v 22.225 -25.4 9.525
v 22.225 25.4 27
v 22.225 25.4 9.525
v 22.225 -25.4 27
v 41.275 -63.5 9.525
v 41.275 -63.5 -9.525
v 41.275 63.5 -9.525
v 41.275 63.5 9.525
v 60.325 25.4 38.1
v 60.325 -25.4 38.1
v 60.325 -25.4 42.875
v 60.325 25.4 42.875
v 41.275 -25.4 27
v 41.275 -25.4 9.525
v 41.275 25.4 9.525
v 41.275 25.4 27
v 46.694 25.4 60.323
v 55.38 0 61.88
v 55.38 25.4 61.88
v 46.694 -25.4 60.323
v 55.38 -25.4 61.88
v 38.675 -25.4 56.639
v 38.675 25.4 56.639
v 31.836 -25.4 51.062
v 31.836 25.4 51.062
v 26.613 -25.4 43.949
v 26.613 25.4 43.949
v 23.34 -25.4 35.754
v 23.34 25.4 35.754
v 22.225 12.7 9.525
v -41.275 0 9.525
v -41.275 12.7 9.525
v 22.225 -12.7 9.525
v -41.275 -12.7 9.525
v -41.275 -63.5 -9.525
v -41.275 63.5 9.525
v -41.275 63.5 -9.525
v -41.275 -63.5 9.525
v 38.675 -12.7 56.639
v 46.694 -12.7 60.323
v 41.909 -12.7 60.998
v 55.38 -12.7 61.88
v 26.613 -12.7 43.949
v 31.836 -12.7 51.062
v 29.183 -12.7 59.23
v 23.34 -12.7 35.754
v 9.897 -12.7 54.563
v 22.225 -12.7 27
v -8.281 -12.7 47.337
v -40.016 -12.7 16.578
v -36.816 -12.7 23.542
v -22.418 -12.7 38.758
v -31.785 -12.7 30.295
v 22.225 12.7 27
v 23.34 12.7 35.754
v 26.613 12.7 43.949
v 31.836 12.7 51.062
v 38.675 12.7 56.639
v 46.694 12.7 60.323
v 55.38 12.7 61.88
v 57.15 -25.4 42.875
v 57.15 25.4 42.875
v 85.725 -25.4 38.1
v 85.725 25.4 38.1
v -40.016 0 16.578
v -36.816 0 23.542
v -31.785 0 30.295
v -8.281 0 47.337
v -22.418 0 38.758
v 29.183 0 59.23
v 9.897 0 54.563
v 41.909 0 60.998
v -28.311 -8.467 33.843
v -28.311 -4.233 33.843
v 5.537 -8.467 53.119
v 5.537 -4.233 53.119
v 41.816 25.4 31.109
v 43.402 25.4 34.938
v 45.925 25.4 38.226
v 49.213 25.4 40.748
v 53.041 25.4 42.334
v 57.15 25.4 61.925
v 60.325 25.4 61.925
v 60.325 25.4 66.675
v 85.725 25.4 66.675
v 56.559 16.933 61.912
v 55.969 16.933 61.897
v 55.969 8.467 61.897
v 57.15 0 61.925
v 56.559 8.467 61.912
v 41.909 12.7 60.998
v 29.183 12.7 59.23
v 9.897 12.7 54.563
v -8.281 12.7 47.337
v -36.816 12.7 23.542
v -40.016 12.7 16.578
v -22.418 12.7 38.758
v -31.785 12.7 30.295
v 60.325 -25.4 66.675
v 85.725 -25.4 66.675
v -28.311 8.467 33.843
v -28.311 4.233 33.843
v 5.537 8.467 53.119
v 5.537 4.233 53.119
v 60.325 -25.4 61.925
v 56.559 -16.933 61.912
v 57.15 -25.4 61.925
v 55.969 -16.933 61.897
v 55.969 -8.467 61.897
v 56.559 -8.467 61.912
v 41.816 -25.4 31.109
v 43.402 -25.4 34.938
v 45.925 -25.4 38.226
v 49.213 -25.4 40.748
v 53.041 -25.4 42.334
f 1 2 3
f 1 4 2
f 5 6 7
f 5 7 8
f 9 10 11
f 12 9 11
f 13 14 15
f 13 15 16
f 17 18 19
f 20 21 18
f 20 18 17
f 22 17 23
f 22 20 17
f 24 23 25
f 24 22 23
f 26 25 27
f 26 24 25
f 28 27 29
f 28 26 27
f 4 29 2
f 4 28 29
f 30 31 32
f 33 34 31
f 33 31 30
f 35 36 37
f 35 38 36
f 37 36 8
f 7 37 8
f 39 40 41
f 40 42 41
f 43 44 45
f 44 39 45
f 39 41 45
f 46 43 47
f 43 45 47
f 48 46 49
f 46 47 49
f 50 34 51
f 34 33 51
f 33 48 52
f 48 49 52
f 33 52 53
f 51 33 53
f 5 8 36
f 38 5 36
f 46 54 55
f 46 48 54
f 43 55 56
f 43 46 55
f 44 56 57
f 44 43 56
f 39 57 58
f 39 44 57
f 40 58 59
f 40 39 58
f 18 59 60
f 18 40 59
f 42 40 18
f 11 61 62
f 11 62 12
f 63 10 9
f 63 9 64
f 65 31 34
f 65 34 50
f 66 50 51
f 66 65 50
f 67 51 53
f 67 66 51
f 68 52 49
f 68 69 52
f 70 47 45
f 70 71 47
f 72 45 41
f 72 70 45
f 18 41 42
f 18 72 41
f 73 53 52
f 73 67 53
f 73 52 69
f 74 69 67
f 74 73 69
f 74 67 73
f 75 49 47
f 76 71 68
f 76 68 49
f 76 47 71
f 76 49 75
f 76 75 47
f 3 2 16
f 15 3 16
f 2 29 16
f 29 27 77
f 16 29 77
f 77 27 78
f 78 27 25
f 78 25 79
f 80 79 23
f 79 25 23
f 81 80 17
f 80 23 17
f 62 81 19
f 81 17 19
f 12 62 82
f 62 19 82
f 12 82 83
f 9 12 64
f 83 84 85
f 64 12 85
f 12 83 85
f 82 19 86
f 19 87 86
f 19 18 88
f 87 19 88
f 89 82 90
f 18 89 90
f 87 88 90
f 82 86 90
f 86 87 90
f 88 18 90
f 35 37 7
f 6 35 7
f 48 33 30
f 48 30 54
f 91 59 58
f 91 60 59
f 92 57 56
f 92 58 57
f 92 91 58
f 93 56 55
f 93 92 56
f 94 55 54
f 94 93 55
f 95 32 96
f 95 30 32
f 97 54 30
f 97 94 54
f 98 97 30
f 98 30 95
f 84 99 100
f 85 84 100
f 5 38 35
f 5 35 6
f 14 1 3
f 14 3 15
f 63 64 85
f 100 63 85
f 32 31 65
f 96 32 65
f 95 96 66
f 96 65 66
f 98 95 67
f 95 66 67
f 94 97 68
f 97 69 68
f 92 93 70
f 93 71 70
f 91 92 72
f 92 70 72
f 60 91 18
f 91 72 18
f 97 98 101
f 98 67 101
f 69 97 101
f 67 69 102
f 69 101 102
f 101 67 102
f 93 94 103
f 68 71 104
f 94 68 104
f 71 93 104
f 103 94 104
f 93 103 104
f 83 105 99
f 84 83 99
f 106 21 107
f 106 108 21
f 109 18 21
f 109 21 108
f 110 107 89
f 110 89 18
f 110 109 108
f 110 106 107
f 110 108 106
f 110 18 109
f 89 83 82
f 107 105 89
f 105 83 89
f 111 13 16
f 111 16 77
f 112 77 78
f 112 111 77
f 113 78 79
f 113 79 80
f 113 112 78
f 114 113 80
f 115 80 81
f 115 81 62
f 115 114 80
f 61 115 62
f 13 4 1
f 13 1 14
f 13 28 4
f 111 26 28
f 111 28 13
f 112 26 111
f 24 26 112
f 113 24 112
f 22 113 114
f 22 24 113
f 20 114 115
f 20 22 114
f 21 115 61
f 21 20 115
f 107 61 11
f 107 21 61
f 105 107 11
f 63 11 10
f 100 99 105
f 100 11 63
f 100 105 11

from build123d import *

# Parameters (mm, degrees)
F1_DEPTH = 63.5
F0_W     = 25.4
F0_H     = 4.7498
F0_H_2   = 4.7752
F0_H_3   = 19.05
F2_DEPTH = 25.4
F3_DEPTH = 12.7


with BuildPart() as f1:
    # F0 (on Front) → F1 (new body, symmetric)
    with BuildSketch(Plane.XZ):
        Polygon((22.225, 9.525), (-41.275, 9.525), (-41.275, -9.525), (41.275, -9.525), (41.275, 9.525), align=None)
    extrude(amount=F1_DEPTH, both=True)


with BuildPart() as f2:
    # F0 (on Front) → F2 (new body, symmetric)
    with BuildSketch(Plane.XZ):
        with BuildLine():
            Line((22.225, 27.0002), (22.225, 9.525))
            Line((22.225, 9.525), (41.275, 9.525))
            Line((41.275, 9.525), (41.275, 27.0002))
            ThreePointArc((41.275, 27.0002), (45.9246798487, 38.2255201513), (57.15, 42.8752))
            Line((57.15, 42.8752), (60.325, 42.8752))
            Line((60.325, 42.8752), (60.325, 61.9252))
            Line((60.325, 61.9252), (57.15, 61.9252))
            add(Edge.make_bspline(
                [(55.3802701372, 61.8803330447), (55.9683647582, 61.8979225065), (56.5582831082, 61.9128875558), (57.15, 61.9252)],
                knots=[110.3500459175, 110.3500459175, 110.3500459175, 110.3500459175, 111.5045361635, 111.5045361635, 111.5045361635, 111.5045361635], degree=3))
            ThreePointArc((55.3802701372, 61.8803330447), (31.836333331, 51.0620765846), (22.225, 27.0002))
        make_face()
        with Locations((73.025, 64.3001)):
            Rectangle(F0_W, F0_H)
        with Locations((73.025, 40.4876)):
            Rectangle(F0_W, F0_H_2)
        with Locations((73.025, 52.4002)):
            Rectangle(F0_W, F0_H_3)
    extrude(amount=F2_DEPTH, both=True)


with BuildPart() as f3:
    # F0 (on Front) → F3 (new body, symmetric)
    with BuildSketch(Plane.XZ):
        with BuildLine():
            add(Edge.make_bspline(
                [(-41.275, 9.525), (-40.3819274059, 34.5407168453), (-0.8317841869, 60.1990733472), (55.3802701372, 61.8803330447)],
                knots=[0, 0, 0, 0, 110.3500459175, 110.3500459175, 110.3500459175, 110.3500459175], degree=3))
            Line((-41.275, 9.525), (22.225, 9.525))
            Line((22.225, 9.525), (22.225, 27.0002))
            ThreePointArc((22.225, 27.0002), (31.836333331, 51.0620765846), (55.3802701372, 61.8803330447))
        make_face()
    extrude(amount=F3_DEPTH, both=True)


solid = Compound([f1.part, f2.part, f3.part])
